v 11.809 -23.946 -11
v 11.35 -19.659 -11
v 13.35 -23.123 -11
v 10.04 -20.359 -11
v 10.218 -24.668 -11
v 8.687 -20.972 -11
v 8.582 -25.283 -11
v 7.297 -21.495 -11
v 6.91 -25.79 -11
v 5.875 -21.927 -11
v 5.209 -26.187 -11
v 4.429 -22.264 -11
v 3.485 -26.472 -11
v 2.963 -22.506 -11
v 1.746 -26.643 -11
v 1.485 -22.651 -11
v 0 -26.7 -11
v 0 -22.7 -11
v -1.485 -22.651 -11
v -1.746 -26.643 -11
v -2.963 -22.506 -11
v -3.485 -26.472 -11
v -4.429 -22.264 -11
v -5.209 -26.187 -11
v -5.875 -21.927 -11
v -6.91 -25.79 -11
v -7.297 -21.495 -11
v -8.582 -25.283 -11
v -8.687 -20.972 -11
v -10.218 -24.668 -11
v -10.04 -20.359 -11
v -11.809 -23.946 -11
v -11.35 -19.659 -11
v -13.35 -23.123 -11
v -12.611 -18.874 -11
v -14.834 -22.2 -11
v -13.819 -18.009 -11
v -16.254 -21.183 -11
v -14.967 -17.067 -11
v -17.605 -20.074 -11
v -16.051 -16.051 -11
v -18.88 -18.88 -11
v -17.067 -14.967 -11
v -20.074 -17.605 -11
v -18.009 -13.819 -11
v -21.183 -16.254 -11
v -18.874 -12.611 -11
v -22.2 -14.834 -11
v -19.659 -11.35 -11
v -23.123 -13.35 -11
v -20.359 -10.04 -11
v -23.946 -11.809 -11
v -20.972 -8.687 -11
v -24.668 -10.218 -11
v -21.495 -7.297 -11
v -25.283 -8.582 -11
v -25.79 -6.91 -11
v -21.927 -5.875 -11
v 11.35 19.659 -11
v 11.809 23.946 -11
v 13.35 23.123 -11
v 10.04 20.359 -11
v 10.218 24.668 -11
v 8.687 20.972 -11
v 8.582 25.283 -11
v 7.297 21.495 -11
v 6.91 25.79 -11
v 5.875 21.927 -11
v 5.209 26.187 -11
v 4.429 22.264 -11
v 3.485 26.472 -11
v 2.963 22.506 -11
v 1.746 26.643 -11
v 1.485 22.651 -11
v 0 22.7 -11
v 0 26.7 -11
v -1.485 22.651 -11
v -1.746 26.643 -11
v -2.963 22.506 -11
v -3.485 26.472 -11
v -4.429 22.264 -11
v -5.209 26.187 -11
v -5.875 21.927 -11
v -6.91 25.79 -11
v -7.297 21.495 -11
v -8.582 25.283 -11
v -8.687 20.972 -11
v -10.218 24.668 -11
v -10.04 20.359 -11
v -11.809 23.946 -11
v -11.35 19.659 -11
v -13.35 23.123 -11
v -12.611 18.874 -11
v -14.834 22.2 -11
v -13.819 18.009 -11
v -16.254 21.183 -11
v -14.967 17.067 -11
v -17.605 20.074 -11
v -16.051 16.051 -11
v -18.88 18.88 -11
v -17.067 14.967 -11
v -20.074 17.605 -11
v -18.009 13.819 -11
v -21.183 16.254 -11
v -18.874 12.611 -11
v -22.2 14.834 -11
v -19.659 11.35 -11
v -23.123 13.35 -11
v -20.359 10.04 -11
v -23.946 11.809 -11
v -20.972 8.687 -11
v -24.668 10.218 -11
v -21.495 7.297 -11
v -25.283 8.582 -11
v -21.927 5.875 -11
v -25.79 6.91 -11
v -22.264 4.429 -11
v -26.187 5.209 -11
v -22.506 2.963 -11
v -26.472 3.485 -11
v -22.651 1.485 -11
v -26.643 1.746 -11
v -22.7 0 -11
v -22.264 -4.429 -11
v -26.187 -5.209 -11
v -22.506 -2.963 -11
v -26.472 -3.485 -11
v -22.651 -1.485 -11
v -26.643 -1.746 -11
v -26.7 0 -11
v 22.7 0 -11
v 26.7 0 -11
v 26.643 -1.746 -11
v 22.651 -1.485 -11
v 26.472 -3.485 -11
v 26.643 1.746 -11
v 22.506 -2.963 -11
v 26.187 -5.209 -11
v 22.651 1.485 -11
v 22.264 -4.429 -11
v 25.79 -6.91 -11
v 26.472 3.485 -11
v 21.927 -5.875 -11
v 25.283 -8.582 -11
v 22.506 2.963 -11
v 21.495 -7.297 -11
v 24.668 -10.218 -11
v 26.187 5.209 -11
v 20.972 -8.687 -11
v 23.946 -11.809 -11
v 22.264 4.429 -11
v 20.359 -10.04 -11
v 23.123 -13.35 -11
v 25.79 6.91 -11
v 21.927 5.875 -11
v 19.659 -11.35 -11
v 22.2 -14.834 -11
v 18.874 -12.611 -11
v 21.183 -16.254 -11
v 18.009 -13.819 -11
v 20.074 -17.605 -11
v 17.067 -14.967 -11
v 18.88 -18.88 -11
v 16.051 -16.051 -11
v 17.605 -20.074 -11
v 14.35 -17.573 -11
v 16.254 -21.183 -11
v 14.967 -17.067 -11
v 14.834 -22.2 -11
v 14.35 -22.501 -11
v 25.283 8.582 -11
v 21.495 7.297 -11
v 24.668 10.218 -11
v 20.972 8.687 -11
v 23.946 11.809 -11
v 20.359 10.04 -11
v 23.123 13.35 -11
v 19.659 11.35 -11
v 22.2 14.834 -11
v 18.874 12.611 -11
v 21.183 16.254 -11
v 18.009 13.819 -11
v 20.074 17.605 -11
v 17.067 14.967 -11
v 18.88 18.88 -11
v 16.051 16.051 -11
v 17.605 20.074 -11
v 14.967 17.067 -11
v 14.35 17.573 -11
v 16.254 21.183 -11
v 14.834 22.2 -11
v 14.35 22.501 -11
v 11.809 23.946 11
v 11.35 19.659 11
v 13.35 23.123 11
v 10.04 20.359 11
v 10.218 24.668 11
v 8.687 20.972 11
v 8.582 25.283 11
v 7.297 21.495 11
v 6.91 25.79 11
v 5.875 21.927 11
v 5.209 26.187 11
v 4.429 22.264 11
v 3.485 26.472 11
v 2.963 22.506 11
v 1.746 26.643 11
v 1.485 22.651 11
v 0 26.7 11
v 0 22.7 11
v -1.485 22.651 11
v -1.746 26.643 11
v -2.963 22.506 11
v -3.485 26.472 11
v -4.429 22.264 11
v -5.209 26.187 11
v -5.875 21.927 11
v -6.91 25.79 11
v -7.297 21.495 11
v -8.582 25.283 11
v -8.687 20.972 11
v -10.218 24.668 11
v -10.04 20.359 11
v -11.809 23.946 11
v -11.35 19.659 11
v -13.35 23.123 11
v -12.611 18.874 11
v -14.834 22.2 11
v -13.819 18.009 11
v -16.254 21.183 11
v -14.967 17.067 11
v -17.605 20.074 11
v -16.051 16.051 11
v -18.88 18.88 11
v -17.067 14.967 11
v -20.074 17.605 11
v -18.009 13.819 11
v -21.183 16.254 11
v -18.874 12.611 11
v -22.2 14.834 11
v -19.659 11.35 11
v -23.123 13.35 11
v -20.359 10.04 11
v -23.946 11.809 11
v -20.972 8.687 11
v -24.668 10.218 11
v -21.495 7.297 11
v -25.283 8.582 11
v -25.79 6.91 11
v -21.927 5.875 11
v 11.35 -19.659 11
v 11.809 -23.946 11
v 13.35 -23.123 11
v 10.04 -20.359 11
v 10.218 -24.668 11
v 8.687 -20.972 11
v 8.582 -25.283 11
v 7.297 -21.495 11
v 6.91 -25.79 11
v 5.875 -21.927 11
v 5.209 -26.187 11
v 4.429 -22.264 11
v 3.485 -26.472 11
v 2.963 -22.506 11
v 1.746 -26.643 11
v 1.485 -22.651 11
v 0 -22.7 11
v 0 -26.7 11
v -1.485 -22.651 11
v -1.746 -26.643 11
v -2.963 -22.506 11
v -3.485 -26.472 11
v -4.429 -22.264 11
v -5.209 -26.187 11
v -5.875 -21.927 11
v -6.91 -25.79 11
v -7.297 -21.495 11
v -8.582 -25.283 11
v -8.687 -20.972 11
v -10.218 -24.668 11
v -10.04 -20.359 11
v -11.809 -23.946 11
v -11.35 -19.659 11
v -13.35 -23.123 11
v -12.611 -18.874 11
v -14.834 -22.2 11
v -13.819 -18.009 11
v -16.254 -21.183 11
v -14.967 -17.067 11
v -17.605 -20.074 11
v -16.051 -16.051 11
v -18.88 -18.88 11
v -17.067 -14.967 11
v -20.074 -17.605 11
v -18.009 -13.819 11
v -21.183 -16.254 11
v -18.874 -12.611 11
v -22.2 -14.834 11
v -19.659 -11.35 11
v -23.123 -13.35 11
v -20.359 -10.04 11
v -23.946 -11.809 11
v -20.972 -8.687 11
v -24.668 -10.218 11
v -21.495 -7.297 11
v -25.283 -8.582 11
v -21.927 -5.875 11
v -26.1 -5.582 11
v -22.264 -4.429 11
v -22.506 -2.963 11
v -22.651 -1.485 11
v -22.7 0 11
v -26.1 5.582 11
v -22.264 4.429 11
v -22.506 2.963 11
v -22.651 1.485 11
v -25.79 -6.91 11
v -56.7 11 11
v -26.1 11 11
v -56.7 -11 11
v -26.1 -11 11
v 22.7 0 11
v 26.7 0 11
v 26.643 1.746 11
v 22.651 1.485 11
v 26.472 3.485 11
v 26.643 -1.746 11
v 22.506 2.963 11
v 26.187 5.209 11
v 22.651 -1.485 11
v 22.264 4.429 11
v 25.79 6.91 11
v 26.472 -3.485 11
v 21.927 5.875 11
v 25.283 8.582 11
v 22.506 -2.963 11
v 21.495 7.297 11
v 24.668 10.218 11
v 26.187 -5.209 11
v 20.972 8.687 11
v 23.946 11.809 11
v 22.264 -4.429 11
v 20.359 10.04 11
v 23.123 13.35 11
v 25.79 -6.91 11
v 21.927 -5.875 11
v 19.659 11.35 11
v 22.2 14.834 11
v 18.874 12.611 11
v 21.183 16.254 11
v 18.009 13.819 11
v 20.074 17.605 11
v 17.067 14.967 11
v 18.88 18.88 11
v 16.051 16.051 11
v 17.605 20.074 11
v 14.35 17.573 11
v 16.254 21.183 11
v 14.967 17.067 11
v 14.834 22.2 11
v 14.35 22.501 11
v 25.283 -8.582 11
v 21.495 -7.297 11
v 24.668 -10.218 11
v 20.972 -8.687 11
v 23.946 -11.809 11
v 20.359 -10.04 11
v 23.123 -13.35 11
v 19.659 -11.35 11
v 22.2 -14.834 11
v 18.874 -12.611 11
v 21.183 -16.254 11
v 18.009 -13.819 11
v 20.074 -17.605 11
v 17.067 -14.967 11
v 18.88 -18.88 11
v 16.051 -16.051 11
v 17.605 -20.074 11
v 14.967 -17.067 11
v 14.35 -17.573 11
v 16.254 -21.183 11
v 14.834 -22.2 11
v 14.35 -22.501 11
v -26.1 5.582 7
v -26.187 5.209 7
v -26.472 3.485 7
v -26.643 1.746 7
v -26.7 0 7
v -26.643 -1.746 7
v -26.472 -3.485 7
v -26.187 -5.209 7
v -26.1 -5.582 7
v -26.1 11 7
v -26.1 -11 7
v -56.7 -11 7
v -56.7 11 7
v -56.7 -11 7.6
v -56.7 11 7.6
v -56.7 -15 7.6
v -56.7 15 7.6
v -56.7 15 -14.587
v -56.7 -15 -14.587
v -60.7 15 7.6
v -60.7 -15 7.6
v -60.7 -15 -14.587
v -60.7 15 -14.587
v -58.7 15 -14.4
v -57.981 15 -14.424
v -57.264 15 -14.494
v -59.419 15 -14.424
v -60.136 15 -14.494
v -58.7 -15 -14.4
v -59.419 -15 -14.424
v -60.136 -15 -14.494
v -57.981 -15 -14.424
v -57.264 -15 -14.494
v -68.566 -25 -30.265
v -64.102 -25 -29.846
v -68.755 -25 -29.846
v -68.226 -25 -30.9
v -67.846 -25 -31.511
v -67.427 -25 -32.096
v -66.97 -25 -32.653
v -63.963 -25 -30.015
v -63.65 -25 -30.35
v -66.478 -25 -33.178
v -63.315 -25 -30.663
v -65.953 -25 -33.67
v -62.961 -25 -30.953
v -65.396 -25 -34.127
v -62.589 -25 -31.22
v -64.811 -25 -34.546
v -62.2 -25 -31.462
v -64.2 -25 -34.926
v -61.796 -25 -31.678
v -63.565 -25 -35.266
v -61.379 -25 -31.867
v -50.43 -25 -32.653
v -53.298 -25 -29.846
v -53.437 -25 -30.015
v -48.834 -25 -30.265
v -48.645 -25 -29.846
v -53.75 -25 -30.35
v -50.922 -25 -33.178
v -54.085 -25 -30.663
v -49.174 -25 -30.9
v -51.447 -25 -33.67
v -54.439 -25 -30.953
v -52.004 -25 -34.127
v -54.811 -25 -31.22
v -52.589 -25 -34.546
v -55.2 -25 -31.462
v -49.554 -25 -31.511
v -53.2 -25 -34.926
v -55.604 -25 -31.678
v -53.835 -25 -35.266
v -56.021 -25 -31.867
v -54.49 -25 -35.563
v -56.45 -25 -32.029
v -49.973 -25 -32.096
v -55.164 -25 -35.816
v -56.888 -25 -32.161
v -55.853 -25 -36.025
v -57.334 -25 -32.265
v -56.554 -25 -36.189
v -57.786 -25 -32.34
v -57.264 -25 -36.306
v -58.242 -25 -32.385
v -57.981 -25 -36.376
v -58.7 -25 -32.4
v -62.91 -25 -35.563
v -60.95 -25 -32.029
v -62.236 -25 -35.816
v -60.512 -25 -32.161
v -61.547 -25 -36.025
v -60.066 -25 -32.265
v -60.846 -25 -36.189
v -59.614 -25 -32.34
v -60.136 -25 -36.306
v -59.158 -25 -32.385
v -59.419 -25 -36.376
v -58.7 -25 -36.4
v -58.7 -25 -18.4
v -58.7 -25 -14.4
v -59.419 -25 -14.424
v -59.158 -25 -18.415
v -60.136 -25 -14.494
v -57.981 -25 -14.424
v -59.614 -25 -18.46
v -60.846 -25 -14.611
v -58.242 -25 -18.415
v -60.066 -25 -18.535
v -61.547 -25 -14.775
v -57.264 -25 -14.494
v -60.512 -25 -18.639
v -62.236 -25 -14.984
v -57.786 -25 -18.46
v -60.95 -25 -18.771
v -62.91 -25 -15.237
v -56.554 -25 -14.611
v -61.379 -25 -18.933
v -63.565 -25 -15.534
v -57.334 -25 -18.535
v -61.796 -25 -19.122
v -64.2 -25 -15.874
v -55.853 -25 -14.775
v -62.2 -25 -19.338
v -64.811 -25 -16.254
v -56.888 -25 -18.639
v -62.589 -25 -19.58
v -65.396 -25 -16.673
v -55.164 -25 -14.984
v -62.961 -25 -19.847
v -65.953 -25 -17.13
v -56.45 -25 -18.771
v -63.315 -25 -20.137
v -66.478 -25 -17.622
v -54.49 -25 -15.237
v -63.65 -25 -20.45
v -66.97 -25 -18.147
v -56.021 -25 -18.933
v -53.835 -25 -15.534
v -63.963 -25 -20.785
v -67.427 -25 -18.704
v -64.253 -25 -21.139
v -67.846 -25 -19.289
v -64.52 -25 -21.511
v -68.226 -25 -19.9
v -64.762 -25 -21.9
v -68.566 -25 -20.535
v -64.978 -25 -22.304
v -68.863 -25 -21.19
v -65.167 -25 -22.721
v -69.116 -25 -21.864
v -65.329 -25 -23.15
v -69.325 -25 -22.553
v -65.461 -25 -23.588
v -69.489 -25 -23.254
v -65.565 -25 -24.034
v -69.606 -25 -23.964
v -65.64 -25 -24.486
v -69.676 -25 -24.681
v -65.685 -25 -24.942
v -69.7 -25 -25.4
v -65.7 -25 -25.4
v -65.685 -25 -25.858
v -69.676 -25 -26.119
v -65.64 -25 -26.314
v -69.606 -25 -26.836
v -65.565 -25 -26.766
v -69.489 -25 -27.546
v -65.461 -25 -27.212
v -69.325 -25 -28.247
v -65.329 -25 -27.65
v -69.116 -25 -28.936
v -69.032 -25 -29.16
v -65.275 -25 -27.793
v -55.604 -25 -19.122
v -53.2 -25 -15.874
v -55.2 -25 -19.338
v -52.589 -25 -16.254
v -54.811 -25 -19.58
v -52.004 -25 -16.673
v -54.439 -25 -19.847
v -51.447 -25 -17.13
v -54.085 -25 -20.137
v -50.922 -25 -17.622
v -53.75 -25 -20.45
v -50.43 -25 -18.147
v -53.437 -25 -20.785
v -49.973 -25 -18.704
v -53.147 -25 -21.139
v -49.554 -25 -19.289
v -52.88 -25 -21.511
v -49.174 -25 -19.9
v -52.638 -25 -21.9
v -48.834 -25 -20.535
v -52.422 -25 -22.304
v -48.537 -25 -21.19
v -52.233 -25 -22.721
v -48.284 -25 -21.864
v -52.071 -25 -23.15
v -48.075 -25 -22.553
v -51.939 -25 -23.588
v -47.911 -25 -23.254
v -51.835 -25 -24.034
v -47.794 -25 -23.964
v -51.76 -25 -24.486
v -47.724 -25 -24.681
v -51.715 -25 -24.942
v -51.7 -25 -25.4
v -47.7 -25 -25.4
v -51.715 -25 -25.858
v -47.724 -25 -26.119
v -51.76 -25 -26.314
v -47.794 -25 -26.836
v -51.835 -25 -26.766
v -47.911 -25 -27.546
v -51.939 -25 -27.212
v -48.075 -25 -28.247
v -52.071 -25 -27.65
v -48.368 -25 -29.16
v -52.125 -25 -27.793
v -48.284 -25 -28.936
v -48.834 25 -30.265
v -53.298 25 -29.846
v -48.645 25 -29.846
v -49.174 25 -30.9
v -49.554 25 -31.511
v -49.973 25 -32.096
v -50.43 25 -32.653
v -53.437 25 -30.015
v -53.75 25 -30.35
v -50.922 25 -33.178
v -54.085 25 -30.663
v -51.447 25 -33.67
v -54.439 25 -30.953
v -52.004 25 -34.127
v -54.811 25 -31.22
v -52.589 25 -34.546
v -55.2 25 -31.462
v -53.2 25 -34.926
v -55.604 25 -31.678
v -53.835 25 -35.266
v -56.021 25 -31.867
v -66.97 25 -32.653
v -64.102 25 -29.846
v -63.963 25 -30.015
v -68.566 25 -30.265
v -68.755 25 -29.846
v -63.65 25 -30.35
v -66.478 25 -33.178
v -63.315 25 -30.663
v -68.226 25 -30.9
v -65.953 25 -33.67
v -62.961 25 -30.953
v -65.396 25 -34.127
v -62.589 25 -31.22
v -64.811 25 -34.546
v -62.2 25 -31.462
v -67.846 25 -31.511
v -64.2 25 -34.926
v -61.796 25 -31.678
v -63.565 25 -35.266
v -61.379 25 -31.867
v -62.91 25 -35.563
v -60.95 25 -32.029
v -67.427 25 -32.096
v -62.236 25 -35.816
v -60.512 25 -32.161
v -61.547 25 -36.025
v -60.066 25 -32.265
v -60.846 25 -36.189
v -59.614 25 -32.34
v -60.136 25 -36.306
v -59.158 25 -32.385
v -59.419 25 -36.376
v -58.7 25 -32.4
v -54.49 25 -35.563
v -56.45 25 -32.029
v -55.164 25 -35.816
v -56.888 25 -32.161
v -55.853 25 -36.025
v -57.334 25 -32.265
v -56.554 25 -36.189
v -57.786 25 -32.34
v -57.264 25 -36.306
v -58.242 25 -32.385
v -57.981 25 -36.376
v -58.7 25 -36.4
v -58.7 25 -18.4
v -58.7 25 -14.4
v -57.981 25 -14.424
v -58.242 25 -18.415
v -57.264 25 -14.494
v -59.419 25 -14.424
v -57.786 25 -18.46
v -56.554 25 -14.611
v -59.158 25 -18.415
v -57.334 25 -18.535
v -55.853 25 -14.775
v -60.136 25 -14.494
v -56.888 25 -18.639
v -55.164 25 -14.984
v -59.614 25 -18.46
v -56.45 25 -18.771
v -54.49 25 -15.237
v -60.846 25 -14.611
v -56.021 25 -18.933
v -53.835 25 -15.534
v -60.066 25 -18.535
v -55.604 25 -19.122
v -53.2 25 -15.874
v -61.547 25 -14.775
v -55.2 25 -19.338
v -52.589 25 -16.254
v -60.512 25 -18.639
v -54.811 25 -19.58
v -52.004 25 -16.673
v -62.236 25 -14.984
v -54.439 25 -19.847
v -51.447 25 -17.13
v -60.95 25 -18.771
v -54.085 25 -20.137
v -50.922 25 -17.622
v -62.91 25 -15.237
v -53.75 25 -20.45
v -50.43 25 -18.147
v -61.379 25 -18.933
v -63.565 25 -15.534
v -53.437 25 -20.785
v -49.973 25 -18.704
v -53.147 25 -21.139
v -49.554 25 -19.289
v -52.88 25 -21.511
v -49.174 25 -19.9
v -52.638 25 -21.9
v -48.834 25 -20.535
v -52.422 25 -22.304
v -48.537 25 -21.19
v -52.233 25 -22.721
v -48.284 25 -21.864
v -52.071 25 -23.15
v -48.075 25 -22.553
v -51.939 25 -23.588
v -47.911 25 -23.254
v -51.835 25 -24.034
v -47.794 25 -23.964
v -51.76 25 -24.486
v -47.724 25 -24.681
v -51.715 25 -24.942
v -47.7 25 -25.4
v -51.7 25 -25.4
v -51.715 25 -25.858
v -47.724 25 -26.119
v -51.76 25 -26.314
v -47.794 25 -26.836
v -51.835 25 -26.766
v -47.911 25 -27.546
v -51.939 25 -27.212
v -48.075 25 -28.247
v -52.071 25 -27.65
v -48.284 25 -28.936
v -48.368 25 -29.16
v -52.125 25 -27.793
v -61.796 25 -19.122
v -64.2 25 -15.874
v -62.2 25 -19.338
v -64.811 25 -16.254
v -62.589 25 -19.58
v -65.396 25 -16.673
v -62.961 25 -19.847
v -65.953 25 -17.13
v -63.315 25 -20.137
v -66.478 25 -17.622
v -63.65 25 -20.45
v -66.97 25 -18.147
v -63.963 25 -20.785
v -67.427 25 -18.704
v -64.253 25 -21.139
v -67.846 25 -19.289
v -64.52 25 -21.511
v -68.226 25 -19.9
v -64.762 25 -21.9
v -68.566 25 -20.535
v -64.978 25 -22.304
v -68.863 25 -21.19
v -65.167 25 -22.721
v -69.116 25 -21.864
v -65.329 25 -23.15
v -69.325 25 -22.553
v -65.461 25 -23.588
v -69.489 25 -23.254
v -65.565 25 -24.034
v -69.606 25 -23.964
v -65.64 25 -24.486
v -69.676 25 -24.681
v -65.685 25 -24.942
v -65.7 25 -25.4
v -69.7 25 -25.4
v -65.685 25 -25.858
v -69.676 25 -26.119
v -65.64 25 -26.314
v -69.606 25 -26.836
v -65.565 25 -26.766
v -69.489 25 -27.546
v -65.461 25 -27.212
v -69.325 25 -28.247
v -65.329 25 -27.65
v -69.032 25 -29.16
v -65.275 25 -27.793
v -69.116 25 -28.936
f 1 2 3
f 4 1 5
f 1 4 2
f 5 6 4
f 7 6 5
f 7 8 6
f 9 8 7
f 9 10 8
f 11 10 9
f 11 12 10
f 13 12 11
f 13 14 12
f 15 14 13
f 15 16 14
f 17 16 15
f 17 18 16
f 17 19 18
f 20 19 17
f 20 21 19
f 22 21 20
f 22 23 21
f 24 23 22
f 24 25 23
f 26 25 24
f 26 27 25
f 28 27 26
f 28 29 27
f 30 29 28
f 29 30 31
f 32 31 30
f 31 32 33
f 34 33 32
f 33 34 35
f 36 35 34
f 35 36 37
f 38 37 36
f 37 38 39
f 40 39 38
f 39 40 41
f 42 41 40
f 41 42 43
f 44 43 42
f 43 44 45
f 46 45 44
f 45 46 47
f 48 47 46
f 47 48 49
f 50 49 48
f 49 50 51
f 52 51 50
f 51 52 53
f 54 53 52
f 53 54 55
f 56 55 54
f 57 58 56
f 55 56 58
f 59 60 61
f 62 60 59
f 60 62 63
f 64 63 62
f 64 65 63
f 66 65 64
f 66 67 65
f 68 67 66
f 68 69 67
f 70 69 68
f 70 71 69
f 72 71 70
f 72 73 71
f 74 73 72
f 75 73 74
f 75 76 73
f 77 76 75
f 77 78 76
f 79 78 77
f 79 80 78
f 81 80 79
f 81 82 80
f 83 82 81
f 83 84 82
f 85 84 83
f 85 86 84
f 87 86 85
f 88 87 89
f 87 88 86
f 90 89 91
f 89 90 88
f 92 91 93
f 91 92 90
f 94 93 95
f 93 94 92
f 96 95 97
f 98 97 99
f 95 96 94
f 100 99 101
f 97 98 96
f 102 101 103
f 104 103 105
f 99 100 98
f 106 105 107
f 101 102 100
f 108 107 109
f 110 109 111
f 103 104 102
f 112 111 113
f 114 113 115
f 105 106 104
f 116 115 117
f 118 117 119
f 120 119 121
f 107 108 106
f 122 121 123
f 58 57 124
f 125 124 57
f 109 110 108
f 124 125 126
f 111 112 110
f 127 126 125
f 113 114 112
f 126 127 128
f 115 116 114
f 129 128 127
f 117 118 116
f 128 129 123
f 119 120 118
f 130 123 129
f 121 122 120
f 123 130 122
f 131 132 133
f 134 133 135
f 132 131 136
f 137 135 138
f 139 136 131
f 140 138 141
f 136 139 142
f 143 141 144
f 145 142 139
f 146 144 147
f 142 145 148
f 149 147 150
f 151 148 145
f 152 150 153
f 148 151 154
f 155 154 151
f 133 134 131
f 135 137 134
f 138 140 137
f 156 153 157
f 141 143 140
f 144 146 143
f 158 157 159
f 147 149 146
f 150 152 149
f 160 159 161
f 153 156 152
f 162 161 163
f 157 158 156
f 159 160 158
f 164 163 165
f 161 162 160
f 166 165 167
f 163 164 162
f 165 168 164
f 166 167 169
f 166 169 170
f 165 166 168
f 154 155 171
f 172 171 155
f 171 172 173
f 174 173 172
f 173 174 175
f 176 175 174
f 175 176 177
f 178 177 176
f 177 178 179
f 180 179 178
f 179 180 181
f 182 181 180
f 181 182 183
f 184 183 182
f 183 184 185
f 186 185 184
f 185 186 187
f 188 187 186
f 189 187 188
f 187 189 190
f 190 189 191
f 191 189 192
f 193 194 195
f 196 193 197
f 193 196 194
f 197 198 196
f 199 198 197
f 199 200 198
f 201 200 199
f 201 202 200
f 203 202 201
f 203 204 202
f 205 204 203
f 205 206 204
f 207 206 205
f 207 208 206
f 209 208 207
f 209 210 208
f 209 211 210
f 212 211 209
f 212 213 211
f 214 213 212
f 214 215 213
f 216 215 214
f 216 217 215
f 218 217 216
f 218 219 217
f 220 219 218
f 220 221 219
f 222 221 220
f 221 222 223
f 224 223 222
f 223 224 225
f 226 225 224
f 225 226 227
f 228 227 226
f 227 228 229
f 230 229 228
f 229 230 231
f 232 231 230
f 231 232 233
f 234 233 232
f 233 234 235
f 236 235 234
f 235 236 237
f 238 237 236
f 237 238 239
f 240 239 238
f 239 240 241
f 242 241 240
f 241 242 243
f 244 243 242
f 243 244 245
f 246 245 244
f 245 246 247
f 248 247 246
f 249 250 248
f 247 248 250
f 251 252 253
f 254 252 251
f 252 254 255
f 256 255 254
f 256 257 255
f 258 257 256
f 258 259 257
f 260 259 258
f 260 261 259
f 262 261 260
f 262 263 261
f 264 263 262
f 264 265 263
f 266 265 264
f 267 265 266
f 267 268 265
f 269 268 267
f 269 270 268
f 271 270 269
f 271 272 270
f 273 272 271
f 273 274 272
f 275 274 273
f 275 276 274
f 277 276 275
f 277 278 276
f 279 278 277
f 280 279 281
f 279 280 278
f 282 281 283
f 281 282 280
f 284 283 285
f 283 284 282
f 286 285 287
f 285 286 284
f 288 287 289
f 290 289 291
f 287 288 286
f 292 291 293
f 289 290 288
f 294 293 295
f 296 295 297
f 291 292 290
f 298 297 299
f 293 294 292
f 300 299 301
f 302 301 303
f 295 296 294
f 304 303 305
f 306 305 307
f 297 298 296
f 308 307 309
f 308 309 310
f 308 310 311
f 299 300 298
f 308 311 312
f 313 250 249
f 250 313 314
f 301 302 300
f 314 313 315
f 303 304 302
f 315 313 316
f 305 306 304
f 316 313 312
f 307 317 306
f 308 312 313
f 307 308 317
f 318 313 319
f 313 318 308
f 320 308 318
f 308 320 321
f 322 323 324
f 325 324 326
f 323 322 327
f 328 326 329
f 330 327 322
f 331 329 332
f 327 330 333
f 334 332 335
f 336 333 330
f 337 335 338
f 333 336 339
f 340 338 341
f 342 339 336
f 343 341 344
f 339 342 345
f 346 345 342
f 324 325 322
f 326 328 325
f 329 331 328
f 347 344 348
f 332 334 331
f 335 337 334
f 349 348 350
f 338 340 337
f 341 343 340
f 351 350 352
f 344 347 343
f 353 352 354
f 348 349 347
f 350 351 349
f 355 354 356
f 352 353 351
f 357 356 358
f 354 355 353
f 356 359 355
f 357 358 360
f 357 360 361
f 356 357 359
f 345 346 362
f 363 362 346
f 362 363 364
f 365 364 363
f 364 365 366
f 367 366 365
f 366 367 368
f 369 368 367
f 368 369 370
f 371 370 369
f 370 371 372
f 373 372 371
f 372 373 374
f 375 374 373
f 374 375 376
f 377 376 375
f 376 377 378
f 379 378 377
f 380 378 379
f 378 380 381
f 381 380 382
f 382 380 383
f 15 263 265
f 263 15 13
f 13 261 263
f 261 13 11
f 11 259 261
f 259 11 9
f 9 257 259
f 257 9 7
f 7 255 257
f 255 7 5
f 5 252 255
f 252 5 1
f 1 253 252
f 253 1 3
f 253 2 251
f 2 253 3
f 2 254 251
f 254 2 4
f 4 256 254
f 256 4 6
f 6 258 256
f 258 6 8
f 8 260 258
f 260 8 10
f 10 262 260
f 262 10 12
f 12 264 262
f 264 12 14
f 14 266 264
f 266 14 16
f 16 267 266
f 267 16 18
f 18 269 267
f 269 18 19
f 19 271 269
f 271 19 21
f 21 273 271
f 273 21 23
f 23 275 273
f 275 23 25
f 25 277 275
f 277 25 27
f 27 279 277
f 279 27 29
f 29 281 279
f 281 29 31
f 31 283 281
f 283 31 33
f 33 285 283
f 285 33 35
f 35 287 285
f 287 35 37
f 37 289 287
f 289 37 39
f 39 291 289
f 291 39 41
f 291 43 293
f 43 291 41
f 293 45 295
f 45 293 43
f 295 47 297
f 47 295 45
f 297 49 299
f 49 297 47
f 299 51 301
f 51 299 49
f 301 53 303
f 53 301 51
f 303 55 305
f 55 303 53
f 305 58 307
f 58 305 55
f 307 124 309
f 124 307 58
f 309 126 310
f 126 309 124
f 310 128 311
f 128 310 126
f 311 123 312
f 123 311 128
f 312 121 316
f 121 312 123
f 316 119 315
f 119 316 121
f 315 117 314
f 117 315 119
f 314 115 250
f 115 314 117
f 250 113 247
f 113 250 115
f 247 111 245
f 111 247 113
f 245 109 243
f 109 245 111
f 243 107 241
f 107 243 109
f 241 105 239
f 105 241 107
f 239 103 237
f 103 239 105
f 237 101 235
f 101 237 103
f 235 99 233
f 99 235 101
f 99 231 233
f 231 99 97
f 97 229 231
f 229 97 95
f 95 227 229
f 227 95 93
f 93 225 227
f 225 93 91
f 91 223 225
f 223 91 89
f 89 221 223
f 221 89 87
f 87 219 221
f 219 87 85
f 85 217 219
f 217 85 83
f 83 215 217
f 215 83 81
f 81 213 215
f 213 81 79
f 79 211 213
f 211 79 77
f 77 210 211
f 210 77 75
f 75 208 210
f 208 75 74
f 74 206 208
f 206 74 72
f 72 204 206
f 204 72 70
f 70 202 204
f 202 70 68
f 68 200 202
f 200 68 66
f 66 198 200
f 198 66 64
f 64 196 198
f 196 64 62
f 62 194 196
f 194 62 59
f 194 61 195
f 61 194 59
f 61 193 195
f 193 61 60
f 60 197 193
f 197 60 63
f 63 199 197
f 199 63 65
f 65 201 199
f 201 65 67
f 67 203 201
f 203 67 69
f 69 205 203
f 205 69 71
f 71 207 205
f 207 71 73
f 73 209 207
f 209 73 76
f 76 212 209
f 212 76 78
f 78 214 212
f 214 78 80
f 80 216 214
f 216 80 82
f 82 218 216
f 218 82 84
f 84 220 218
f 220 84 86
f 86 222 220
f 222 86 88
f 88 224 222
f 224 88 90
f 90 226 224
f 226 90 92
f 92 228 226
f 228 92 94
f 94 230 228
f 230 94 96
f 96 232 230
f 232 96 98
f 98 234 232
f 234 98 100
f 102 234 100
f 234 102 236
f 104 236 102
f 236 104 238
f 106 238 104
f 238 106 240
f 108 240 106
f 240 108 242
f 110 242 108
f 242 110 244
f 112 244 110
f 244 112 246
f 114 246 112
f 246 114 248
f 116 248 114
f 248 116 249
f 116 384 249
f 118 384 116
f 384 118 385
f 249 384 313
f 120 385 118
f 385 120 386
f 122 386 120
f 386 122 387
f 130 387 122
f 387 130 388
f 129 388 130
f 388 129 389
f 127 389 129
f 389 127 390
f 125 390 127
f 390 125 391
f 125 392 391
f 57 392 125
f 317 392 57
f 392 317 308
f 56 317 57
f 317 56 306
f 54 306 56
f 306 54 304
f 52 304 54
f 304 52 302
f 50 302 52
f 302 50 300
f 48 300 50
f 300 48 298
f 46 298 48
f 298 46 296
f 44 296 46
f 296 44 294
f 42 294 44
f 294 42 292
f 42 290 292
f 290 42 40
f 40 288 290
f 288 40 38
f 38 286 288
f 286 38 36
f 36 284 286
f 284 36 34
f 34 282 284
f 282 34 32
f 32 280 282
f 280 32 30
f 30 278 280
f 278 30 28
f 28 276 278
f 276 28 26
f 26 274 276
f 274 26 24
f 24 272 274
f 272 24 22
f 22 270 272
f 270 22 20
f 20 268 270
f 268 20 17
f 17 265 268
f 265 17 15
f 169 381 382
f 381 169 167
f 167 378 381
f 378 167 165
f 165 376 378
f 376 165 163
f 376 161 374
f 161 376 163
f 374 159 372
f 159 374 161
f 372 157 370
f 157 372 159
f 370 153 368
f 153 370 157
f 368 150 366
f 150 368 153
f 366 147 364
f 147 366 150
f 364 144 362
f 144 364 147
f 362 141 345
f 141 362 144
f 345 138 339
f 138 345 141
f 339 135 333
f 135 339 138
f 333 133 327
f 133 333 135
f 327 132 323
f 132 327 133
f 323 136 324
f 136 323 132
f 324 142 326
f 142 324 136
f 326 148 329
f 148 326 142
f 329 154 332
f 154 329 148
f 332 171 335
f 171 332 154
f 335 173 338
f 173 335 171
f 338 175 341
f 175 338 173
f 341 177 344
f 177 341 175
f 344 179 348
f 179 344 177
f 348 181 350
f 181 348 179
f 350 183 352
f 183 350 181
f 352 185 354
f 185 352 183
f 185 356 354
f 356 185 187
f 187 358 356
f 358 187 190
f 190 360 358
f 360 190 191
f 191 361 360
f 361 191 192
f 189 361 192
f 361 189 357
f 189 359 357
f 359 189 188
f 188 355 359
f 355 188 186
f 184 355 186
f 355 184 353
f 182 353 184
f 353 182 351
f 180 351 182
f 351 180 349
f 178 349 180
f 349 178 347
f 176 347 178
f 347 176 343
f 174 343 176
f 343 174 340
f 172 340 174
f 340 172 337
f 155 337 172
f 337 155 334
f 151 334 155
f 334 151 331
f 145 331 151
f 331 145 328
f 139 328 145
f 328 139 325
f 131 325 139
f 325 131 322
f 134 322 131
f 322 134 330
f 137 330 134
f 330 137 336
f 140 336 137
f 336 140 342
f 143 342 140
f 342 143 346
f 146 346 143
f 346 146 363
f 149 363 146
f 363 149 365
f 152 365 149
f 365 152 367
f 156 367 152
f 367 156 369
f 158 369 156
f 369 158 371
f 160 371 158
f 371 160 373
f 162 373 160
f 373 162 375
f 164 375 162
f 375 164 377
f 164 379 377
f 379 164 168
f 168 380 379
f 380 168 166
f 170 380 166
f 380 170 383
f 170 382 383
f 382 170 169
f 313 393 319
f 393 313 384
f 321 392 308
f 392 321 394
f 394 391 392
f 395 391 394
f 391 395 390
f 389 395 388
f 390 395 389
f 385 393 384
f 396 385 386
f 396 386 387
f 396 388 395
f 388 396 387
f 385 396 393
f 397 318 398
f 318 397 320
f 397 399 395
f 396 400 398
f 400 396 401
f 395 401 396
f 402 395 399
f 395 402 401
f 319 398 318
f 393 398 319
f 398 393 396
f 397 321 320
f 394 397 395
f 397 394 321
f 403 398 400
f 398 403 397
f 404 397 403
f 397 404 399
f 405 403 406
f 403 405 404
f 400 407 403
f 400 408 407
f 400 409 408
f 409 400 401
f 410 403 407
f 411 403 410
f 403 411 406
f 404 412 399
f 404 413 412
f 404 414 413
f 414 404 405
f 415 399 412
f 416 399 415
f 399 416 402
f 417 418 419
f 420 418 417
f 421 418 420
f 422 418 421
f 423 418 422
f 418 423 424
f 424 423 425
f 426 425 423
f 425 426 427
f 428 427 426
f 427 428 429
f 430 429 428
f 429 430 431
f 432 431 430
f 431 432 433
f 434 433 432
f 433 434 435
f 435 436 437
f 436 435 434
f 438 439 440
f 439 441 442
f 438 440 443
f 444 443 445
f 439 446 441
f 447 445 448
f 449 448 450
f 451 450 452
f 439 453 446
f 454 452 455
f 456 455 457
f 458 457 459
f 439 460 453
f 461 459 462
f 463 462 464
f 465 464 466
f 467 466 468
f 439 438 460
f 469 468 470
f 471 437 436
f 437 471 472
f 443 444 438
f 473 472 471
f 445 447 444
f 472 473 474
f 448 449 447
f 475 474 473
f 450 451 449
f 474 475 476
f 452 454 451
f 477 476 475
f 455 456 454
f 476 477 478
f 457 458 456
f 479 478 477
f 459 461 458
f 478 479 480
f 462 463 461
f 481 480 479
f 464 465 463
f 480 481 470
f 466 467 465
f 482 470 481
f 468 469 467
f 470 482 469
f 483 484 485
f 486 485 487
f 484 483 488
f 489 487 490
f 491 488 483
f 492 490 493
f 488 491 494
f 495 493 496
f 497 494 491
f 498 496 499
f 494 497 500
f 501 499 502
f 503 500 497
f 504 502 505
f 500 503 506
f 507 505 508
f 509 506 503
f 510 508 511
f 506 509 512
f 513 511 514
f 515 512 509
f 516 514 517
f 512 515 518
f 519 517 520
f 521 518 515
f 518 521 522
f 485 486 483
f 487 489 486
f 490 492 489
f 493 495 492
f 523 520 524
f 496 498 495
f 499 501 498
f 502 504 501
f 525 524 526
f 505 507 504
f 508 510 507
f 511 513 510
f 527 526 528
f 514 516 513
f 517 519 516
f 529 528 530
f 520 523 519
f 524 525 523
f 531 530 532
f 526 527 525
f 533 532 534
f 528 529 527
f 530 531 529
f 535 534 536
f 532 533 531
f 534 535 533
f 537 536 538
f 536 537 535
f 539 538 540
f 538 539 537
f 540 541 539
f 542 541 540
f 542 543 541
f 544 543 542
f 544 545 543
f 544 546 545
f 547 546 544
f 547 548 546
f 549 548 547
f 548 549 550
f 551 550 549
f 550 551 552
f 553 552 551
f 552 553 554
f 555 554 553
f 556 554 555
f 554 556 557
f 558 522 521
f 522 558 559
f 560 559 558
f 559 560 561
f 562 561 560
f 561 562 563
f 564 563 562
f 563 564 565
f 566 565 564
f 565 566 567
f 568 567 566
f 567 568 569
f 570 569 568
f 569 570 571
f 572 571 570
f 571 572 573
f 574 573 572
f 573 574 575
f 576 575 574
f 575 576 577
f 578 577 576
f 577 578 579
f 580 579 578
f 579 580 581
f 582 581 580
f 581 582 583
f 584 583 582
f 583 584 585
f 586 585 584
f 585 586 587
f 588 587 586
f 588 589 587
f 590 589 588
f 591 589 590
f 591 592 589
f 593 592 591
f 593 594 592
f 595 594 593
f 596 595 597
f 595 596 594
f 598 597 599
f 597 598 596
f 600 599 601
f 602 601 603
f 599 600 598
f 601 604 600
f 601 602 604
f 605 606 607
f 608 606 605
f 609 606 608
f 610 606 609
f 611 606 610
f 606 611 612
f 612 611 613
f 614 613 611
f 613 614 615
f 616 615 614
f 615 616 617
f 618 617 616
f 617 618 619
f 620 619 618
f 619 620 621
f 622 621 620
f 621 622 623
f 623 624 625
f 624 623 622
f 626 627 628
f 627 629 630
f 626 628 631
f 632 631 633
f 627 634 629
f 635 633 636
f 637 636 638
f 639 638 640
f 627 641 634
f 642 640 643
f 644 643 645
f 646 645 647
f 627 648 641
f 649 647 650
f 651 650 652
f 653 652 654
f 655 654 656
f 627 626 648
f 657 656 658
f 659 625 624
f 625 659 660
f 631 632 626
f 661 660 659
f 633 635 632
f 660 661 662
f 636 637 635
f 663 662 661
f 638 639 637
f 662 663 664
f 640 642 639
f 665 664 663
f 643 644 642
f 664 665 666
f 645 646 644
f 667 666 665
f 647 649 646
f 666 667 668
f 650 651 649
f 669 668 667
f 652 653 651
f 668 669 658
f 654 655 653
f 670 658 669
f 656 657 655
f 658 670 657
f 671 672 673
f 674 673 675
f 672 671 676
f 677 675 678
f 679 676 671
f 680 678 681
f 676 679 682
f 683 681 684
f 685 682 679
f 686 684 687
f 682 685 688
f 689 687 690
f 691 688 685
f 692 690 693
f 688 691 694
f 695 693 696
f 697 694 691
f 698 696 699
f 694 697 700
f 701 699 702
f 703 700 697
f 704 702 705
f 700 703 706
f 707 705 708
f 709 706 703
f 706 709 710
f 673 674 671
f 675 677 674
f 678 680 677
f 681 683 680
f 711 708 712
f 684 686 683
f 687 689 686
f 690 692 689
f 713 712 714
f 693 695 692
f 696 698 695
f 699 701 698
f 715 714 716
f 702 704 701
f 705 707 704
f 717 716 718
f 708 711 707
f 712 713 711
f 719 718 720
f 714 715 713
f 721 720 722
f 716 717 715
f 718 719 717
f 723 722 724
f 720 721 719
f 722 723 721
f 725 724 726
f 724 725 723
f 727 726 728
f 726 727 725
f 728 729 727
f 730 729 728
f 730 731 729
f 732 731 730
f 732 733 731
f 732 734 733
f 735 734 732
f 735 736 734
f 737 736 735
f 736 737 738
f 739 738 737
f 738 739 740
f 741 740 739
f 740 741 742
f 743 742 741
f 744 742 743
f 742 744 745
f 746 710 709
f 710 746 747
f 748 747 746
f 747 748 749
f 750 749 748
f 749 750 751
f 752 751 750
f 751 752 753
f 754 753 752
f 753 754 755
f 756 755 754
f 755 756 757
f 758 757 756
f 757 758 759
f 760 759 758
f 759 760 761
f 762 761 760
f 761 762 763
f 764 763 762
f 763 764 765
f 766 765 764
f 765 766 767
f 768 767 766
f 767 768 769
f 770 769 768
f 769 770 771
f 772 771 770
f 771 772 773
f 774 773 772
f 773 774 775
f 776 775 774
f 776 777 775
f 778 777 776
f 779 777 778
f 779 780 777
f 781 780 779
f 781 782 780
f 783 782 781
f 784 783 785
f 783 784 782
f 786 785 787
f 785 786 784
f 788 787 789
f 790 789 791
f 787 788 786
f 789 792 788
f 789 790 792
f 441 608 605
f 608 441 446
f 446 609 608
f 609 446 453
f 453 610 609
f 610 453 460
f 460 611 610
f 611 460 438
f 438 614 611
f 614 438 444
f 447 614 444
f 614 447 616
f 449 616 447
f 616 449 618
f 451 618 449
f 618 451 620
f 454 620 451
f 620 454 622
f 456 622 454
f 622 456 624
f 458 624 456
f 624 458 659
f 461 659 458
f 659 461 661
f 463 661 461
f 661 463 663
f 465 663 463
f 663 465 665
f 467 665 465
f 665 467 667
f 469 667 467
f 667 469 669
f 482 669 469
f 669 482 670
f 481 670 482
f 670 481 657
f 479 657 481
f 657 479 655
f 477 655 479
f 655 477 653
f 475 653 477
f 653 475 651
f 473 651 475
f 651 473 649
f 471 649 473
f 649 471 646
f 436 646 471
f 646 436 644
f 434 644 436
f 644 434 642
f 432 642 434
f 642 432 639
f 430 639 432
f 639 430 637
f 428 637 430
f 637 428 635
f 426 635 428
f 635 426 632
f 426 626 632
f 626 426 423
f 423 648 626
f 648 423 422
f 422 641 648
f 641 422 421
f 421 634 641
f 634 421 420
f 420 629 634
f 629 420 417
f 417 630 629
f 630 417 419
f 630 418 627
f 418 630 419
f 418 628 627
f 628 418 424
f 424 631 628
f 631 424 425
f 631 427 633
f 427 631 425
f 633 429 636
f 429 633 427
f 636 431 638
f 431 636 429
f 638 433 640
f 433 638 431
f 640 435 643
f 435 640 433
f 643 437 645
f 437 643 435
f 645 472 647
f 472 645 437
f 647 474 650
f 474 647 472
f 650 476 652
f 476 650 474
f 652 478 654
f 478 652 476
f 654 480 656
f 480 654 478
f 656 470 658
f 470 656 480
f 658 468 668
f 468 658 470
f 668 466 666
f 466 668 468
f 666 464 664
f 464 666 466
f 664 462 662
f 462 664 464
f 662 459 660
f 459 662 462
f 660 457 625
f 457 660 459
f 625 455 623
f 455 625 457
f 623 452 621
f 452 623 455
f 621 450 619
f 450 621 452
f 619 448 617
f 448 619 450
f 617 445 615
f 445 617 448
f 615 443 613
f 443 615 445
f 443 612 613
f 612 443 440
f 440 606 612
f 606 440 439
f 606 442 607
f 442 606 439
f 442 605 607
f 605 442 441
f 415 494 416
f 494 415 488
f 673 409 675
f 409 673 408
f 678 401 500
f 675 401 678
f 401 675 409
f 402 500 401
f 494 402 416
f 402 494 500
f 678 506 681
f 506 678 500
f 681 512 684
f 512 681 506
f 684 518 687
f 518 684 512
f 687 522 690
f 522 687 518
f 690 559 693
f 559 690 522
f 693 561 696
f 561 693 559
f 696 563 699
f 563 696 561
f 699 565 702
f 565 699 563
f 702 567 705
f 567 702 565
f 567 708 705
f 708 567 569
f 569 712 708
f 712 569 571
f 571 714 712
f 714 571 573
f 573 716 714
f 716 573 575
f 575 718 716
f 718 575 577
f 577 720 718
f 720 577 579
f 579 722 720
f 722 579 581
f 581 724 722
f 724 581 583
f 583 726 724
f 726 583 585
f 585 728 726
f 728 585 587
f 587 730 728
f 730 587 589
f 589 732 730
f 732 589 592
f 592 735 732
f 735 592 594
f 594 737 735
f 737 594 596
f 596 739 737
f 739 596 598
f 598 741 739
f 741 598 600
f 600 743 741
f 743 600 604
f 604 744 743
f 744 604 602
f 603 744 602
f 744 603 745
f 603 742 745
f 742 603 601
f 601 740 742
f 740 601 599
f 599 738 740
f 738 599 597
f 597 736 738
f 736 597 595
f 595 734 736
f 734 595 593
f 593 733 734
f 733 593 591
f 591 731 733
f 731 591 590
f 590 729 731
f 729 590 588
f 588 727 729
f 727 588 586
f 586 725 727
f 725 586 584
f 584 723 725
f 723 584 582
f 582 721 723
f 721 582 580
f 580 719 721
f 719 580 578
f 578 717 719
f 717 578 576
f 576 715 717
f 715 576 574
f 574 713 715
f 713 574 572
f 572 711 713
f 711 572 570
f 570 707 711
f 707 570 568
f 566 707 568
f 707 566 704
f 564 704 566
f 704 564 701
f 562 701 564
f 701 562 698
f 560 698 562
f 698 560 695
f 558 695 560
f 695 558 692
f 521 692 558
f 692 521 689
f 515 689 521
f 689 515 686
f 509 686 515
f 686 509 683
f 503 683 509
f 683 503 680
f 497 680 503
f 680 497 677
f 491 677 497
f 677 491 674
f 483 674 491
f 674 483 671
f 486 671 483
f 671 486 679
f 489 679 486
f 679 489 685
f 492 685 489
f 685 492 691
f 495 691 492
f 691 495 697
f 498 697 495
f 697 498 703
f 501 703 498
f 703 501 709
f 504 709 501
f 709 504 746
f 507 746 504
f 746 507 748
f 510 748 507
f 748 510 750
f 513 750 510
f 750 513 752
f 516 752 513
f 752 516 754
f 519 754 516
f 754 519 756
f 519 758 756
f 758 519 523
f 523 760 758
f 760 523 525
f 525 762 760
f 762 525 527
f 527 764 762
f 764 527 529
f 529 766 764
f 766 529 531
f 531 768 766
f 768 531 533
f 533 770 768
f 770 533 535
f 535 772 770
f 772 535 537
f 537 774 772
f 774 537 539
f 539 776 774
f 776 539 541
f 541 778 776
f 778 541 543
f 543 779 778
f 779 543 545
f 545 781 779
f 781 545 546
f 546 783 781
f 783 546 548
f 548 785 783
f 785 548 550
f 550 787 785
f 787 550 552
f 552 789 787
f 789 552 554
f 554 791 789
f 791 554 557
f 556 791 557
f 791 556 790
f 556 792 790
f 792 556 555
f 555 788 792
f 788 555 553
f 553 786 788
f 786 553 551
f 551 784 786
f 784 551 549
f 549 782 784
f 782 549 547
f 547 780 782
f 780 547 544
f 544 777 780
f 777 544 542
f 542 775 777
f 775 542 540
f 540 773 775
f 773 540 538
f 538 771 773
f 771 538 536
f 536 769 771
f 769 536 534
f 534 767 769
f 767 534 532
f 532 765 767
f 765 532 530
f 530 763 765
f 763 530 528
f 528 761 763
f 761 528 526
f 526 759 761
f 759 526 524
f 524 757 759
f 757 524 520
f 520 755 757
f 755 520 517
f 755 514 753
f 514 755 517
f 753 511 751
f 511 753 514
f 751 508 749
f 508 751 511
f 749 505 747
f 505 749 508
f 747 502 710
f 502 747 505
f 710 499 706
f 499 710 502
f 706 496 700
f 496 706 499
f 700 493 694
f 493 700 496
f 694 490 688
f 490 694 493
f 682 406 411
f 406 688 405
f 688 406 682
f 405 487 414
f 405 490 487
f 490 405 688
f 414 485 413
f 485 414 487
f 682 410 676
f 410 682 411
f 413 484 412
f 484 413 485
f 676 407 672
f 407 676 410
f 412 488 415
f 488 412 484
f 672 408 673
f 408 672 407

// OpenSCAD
// Sponge holder for kitchen faucet — 3D version with sponge pinch clip.
// Faucet clip (Ø 45 mm, axis Z) + arm "por detrás" + 90° drop + sponge
// C-clip (axis Y, mouth -Z) that pinches the sponge by its top edge.
// Z is up. All dimensions in millimetres.

// ====== Parameters ======
wall_t                = 4;
clip_inner_d          = 45.4;   // 45 mm shaft + 0.4 mm tolerance for PLA
clip_height           = 22;
clip_wrap_deg         = 240;    // PLA-friendly snap (less wrap = more flex)
clip_overlap          = 0.6;

arm_len               = 30;
arm_width_y           = 22;

drop_len              = 22;
drop_width_y          = 30;

sponge_gap            = 14;     // < 20 mm: pinches the sponge thickness
sponge_clip_len_y     = 50;
sponge_clip_wrap_deg  = 220;

$fn = 96;

union() {
    faucet_clip();
    arm();
    drop();
    sponge_clip();
}

module faucet_clip() {
    r_in  = clip_inner_d / 2;
    r_out = r_in + wall_t;
    half_open = (360 - clip_wrap_deg) / 2;
    translate([0, 0, -clip_height / 2])
    linear_extrude(clip_height)
        difference() {
            difference() {
                circle(r = r_out);
                circle(r = r_in);
            }
            polygon([
                [0, 0],
                [(r_out + 2) * cos(-half_open), (r_out + 2) * sin(-half_open)],
                [(r_out + 2) * cos( half_open), (r_out + 2) * sin( half_open)],
            ]);
        }
}

module arm() {
    r_out = clip_inner_d / 2 + wall_t;
    x_start = -r_out + clip_overlap;
    x_end   = -r_out - arm_len;
    z_top   = clip_height / 2;
    z_bot   = z_top - wall_t;
    translate([(x_start + x_end) / 2, 0, (z_top + z_bot) / 2])
        cube([abs(x_end - x_start), arm_width_y, wall_t], center = true);
}

module drop() {
    r_out = clip_inner_d / 2 + wall_t;
    x_arm_end = -r_out - arm_len;
    z_arm_bot = clip_height / 2 - wall_t;
    translate([
        x_arm_end - wall_t / 2,
        0,
        z_arm_bot - drop_len / 2 + clip_overlap / 2,
    ])
        cube([wall_t, drop_width_y, drop_len + clip_overlap], center = true);
}

module sponge_clip() {
    r_in  = sponge_gap / 2;
    r_out = r_in + wall_t;
    half_open = (360 - sponge_clip_wrap_deg) / 2;

    r_out_faucet  = clip_inner_d / 2 + wall_t;
    x_drop_center = -r_out_faucet - arm_len - wall_t / 2;
    z_drop_bot    = clip_height / 2 - wall_t - drop_len;

    // build the C-clip with axis along Z, mouth at +Y, then rotate so axis
    // becomes Y and mouth becomes -Z.
    translate([x_drop_center, 0, z_drop_bot - r_out + clip_overlap])
    rotate([-90, 0, 0])
    translate([0, 0, -sponge_clip_len_y / 2])
    linear_extrude(sponge_clip_len_y)
        difference() {
            difference() {
                circle(r = r_out);
                circle(r = r_in);
            }
            // mouth wedge on +Y direction (angle 90°)
            polygon([
                [0, 0],
                [(r_out + 2) * cos(90 - half_open),
                 (r_out + 2) * sin(90 - half_open)],
                [(r_out + 2) * cos(90 + half_open),
                 (r_out + 2) * sin(90 + half_open)],
            ]);
        }
}
